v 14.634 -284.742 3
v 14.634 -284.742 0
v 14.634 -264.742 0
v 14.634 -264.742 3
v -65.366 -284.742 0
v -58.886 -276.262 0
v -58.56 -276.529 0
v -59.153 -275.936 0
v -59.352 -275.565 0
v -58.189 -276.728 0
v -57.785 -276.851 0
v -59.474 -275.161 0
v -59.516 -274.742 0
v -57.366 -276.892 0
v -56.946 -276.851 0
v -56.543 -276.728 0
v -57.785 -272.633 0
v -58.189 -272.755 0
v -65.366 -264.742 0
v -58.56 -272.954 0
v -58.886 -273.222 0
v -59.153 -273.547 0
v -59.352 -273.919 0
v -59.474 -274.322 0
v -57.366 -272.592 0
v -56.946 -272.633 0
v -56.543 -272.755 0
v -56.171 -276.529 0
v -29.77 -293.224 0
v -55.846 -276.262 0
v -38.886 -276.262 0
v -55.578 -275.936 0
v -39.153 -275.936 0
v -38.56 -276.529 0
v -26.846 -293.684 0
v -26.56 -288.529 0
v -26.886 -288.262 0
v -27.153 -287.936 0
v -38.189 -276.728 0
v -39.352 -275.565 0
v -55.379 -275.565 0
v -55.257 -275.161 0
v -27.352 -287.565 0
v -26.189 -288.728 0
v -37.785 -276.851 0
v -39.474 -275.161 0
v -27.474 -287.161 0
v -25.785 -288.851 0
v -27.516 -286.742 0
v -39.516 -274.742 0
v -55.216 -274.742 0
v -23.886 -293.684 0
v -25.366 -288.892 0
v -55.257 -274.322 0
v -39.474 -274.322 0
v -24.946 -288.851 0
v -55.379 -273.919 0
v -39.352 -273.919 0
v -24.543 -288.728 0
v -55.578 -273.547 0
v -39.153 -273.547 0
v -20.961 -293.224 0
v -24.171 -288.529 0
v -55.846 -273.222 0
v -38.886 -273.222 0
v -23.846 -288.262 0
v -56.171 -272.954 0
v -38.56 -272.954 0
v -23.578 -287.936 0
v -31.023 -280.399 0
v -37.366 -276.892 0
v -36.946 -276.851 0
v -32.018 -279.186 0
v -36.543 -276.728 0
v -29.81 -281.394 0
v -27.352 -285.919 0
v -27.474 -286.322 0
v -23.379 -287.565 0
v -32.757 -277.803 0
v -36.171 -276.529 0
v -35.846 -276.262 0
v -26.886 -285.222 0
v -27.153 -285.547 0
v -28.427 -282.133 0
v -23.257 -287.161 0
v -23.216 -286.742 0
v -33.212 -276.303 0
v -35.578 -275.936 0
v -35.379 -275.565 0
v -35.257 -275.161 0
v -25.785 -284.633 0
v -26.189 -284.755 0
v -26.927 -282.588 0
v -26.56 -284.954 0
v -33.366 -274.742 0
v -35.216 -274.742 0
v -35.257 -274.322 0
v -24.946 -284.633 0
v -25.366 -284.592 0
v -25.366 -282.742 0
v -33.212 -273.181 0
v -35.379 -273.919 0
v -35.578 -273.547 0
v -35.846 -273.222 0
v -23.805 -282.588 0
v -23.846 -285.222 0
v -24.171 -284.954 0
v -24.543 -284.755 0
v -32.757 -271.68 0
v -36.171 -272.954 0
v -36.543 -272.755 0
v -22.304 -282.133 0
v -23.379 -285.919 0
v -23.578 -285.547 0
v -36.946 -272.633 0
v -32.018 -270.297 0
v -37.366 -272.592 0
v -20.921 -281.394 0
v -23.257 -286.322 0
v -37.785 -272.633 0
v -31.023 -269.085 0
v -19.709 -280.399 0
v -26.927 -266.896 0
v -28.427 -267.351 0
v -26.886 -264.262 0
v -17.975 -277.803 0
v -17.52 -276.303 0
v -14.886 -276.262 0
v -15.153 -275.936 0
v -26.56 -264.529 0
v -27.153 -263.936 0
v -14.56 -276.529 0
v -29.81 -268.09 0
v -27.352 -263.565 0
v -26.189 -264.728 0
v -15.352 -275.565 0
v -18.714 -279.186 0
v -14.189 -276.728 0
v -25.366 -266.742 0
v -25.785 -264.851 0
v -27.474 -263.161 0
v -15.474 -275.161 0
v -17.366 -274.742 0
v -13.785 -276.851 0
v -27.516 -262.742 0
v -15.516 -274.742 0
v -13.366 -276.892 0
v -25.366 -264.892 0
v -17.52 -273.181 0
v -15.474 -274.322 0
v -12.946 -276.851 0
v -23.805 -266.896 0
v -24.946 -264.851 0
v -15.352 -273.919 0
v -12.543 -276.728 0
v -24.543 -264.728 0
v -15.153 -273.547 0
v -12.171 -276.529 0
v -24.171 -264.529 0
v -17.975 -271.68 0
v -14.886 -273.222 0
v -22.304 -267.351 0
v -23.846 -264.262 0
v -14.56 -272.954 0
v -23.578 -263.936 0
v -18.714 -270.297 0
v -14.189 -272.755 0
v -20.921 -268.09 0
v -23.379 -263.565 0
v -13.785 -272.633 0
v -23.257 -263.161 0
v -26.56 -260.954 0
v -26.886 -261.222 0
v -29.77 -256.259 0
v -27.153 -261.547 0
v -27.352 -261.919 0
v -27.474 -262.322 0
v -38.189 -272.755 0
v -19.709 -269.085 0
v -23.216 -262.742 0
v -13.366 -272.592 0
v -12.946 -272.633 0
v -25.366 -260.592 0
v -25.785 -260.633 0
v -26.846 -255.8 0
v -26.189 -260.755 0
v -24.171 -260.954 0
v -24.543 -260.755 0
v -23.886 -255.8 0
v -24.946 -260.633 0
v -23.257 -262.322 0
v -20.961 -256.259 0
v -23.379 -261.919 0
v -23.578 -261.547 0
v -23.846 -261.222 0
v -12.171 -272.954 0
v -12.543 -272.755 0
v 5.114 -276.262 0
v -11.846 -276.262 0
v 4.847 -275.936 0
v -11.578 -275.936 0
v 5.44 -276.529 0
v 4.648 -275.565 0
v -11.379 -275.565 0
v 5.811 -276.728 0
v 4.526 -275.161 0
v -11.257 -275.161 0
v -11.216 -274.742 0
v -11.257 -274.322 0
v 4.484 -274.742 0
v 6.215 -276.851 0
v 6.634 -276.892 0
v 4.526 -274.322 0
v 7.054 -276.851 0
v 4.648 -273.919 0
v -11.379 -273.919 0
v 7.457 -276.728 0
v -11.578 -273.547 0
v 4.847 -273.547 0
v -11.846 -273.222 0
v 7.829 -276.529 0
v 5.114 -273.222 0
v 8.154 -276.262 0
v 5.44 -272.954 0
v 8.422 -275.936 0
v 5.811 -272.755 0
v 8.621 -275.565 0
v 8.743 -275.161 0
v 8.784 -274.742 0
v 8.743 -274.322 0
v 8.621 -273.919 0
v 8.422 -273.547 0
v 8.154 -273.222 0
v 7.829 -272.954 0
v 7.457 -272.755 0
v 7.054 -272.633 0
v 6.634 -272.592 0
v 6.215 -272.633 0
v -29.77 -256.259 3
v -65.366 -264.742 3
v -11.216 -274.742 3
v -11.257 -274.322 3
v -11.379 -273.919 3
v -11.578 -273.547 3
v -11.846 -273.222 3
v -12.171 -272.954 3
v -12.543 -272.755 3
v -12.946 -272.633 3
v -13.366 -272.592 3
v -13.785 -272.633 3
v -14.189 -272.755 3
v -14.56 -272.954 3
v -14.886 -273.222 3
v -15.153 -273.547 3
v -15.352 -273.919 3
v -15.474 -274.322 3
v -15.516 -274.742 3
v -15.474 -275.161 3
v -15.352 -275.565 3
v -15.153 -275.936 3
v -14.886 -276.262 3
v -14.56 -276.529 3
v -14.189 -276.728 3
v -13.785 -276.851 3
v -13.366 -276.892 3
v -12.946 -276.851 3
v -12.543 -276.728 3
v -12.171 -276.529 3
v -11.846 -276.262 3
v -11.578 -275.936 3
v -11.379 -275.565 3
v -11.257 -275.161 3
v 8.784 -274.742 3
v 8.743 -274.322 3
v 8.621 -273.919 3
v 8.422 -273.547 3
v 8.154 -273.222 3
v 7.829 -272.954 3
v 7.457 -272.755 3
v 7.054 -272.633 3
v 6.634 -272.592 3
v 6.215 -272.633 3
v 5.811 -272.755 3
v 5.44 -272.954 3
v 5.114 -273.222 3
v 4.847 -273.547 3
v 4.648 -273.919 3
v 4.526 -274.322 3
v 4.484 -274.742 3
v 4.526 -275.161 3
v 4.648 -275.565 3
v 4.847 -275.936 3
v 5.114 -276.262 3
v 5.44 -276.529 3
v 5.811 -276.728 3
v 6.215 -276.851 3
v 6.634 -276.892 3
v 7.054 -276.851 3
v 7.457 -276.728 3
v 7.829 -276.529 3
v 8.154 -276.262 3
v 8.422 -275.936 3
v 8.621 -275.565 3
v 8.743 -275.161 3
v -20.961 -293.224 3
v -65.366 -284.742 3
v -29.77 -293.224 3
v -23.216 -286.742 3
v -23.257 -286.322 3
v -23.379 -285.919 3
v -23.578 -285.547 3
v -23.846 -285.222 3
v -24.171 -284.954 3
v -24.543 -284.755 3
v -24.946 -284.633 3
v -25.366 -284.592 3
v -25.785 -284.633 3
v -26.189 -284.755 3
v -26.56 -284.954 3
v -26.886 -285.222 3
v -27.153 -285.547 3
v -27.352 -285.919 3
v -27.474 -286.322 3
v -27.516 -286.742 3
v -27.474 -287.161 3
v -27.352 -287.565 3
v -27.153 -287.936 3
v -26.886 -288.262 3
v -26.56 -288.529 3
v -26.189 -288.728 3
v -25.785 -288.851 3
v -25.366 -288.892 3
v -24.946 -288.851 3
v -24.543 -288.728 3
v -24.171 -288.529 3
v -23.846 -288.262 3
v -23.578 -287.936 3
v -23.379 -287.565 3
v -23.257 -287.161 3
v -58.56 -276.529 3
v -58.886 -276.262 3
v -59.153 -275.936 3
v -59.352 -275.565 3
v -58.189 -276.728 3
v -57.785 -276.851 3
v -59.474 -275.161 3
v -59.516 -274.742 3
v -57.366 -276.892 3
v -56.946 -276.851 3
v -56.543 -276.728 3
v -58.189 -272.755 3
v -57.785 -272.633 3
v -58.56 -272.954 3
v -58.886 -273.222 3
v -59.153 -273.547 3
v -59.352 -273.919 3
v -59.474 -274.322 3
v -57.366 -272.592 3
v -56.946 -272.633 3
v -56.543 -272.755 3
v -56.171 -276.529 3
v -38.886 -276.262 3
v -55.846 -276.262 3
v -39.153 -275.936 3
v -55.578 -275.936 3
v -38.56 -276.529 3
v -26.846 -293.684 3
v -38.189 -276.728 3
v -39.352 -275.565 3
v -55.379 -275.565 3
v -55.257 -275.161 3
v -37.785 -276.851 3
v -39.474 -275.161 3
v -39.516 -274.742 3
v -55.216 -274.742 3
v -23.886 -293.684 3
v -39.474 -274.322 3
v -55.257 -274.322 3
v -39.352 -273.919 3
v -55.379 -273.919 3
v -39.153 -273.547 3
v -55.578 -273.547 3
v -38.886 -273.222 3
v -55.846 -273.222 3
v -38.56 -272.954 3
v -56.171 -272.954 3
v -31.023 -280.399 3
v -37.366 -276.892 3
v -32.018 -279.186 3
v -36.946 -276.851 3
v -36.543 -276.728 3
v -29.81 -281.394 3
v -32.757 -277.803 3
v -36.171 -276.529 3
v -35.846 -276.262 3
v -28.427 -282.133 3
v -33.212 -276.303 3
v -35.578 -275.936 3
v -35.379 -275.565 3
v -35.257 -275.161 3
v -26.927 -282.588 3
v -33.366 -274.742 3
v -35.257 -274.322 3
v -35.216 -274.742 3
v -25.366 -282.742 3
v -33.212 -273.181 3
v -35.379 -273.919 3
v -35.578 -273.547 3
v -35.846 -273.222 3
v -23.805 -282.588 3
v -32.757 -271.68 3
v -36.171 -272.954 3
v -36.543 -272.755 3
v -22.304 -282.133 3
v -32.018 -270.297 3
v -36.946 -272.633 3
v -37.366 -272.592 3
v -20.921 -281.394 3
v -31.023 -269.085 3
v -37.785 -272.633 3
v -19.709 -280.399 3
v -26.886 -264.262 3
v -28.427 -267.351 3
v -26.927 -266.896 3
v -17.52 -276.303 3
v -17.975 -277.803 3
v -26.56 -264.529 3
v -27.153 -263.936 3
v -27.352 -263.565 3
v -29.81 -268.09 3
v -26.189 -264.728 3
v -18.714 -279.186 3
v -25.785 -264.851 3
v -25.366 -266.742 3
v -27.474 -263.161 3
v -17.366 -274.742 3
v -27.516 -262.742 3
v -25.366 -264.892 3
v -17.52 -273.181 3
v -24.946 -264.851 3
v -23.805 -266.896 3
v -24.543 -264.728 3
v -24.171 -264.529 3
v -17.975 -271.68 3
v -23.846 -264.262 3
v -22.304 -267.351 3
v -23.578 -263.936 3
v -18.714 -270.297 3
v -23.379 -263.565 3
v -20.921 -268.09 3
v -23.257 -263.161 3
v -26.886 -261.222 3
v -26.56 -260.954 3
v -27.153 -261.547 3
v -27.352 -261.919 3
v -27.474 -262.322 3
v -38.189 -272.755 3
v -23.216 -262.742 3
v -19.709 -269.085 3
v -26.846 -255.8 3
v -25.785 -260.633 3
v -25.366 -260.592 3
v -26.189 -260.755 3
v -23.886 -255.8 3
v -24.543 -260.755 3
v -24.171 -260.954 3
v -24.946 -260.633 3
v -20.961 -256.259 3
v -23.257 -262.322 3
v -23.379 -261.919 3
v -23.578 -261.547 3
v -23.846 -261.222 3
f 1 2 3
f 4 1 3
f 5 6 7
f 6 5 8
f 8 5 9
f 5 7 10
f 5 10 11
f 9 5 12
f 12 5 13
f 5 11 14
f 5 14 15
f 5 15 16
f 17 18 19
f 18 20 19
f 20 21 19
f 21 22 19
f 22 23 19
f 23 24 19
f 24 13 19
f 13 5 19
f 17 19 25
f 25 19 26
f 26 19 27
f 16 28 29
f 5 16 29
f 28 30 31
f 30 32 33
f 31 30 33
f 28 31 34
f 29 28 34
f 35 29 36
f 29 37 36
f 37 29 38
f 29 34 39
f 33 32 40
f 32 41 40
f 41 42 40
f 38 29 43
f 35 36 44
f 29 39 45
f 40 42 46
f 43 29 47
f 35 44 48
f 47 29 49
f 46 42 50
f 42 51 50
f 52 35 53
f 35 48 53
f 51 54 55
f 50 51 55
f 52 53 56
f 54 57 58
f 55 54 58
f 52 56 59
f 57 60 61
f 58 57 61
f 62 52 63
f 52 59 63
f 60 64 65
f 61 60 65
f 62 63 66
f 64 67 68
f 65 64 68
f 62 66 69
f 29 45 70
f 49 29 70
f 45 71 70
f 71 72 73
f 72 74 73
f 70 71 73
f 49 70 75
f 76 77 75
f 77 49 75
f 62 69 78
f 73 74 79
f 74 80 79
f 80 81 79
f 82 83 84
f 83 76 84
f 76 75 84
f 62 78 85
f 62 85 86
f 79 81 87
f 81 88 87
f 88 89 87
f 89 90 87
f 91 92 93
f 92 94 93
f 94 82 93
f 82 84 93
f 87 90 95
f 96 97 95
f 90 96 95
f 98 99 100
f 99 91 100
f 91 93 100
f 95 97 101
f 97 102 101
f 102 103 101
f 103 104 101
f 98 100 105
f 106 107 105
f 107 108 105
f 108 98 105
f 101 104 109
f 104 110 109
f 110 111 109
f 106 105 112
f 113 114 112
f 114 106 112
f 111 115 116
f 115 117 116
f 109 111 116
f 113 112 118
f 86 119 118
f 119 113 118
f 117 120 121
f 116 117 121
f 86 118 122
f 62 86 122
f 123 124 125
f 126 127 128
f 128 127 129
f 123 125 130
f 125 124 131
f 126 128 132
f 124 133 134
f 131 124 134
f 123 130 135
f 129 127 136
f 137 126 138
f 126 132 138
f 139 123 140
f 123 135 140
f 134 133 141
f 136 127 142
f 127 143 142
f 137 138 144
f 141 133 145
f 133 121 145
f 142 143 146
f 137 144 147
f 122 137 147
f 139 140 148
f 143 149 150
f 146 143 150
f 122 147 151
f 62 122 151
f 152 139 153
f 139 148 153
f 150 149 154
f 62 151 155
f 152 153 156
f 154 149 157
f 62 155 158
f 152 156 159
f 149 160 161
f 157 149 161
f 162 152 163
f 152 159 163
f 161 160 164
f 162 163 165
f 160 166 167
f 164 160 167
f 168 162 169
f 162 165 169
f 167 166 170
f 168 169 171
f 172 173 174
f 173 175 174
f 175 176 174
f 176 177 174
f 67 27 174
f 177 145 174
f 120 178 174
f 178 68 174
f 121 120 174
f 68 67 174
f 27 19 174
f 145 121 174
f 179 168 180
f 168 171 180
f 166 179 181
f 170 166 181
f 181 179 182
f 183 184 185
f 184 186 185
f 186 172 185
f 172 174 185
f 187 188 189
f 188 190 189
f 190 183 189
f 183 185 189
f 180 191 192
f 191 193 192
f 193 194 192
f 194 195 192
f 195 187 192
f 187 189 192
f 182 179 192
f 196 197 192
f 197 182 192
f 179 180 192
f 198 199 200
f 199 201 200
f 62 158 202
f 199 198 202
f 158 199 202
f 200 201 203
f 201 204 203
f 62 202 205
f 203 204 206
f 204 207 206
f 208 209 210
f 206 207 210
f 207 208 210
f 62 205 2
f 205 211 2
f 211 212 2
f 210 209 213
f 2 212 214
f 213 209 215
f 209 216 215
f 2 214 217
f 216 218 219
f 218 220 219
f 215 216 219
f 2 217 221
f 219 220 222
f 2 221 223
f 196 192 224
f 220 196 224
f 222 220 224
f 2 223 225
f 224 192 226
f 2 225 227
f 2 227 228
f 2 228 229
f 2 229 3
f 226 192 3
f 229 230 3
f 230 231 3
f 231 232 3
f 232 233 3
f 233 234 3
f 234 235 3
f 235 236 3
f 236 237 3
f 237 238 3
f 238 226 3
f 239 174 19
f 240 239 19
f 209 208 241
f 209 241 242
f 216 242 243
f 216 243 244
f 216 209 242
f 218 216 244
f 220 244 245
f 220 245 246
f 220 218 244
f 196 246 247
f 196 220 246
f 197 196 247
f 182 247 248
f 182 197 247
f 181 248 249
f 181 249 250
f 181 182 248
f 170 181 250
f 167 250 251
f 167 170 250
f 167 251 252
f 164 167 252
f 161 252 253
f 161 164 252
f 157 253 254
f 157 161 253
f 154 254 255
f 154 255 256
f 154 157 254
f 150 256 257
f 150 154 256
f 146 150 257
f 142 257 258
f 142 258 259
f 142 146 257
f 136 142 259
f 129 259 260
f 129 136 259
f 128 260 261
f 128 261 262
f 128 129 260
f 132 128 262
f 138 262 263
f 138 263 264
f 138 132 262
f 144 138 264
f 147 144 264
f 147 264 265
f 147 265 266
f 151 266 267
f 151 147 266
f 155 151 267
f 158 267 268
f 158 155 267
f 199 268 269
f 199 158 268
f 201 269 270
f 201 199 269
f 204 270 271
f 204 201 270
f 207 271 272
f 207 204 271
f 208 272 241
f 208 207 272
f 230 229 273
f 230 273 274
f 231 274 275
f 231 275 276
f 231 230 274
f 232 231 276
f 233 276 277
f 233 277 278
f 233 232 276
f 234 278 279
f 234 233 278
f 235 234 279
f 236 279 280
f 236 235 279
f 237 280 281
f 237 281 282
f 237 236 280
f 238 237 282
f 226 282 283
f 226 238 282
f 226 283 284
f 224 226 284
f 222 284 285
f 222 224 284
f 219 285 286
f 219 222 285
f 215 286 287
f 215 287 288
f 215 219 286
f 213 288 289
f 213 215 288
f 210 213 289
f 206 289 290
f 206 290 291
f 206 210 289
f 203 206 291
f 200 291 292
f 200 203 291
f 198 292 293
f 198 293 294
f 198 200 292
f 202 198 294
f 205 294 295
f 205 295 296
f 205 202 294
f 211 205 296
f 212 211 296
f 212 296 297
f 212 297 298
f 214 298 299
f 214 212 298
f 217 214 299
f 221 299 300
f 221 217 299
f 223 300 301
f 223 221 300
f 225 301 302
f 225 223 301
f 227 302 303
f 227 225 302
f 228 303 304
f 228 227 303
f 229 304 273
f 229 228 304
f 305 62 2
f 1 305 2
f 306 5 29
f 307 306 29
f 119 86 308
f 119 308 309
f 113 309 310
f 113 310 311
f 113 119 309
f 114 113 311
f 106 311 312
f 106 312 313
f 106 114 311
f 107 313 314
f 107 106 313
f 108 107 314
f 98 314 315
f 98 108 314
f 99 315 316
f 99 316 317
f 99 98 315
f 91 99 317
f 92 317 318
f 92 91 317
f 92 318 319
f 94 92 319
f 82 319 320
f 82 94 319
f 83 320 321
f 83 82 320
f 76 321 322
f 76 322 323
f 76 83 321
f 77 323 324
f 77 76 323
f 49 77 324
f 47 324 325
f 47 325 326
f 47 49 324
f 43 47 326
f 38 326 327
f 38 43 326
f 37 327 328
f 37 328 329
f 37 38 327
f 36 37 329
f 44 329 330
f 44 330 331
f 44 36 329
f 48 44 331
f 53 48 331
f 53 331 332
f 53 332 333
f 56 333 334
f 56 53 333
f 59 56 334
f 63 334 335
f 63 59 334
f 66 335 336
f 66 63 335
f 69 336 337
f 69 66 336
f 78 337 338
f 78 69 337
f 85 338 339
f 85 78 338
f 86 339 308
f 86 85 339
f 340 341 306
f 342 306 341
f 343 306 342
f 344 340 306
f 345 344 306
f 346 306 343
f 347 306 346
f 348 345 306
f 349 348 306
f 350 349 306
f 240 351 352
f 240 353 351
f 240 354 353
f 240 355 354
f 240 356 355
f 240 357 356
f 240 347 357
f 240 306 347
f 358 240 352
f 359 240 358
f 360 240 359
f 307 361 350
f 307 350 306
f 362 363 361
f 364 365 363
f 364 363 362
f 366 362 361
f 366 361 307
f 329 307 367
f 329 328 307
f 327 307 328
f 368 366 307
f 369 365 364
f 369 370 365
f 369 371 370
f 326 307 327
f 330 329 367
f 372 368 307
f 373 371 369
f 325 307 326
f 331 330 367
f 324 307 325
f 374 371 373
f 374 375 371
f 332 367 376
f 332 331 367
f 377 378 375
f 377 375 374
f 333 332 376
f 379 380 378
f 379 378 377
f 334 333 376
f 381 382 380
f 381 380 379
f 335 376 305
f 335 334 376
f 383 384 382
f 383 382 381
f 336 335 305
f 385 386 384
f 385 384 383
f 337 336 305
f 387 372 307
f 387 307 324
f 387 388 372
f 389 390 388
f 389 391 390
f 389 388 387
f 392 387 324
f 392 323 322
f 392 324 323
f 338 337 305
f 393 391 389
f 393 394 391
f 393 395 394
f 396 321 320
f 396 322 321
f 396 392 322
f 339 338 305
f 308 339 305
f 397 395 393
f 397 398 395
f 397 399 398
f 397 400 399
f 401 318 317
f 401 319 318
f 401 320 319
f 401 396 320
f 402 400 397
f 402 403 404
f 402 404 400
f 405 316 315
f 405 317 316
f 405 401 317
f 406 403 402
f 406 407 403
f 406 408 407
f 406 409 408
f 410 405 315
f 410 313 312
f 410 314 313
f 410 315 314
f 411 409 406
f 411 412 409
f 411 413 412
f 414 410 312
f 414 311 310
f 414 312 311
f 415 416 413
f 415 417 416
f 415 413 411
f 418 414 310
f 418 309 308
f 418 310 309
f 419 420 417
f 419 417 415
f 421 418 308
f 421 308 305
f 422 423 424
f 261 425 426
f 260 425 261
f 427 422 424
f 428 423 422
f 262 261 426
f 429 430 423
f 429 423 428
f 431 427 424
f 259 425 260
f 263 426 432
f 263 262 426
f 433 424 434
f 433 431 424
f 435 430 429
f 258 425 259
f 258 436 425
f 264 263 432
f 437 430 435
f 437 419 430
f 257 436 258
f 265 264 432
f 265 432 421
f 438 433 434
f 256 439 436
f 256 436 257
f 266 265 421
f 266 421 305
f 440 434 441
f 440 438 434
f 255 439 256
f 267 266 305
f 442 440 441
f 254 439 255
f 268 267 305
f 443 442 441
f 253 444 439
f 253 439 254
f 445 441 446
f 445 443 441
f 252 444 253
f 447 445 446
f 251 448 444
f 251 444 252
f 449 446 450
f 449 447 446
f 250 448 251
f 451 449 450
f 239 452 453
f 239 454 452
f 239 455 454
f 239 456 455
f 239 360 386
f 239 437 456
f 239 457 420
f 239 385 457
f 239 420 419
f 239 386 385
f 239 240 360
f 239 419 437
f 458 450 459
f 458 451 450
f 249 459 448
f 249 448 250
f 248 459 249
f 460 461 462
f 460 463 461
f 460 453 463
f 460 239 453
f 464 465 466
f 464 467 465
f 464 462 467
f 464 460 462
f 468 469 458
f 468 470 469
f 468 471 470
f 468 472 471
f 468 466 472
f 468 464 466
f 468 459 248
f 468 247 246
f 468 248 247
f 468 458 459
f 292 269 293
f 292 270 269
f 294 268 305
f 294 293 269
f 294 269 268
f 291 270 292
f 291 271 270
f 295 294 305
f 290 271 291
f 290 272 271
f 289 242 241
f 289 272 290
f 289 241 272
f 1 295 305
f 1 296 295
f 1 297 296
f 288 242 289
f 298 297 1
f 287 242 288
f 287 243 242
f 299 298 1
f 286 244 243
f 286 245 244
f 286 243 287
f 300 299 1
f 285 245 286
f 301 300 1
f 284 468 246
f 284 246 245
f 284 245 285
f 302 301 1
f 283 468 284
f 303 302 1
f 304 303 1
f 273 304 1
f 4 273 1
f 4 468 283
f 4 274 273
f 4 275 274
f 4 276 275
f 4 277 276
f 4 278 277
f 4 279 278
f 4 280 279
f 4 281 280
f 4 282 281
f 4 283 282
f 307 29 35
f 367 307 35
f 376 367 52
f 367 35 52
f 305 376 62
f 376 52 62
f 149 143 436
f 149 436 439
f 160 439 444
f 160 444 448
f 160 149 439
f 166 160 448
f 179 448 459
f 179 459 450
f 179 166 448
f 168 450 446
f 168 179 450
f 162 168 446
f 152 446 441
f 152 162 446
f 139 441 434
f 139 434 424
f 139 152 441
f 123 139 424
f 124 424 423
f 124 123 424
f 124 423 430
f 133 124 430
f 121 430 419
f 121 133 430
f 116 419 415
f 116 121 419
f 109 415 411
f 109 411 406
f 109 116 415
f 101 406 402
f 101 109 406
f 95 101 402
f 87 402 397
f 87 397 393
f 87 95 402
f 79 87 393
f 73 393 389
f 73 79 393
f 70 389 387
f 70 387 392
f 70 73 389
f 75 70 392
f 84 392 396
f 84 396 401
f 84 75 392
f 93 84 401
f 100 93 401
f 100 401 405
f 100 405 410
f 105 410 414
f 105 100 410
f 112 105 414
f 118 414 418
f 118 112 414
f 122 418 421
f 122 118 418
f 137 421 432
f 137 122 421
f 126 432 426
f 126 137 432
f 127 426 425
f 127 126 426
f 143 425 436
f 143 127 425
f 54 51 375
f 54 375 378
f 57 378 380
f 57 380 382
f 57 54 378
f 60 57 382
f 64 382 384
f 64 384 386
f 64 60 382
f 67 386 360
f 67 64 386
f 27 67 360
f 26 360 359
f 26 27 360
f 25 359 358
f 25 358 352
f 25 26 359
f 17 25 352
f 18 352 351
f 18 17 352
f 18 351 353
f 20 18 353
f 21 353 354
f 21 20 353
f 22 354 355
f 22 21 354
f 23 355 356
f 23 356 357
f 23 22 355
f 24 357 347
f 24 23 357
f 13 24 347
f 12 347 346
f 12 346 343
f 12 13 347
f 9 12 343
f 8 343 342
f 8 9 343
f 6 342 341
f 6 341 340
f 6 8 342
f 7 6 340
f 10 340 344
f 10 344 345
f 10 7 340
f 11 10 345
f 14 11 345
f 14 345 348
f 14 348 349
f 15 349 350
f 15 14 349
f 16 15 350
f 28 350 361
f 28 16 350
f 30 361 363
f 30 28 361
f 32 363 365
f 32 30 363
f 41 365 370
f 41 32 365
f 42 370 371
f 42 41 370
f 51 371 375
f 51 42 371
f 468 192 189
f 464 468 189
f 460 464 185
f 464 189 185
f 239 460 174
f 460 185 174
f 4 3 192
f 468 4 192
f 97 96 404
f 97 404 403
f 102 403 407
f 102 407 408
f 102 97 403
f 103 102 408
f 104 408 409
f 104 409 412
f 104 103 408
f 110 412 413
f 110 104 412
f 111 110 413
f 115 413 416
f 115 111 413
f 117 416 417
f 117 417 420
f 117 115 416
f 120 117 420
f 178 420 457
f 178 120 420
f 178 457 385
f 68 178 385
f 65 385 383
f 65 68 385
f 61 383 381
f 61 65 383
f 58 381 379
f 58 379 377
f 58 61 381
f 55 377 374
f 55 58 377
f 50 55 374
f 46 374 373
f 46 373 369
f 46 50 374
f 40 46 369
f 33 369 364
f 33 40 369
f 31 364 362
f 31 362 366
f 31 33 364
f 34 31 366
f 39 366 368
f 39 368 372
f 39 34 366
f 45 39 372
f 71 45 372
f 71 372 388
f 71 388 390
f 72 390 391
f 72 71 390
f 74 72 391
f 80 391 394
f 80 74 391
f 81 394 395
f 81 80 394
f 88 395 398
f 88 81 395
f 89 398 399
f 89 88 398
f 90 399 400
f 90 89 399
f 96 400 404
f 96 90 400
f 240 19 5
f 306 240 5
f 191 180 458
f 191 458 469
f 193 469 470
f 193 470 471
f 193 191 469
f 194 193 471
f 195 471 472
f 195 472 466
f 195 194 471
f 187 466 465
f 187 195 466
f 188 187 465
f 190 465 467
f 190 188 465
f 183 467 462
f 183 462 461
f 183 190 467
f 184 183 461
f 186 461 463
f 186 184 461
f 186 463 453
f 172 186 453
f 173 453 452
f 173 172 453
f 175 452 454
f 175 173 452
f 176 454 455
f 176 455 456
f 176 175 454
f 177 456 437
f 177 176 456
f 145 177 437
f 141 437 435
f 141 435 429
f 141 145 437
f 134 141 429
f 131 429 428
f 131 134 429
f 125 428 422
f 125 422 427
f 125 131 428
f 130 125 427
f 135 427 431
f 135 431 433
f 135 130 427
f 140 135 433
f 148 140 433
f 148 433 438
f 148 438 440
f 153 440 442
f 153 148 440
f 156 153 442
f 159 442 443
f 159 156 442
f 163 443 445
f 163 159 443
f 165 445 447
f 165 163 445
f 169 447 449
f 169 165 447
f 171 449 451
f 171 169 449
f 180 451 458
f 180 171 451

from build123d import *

# Parameters (mm, degrees)
SKETCH1_R      = 2.15
SKETCH1_R_2    = 8
EXTRUDE1_DEPTH = 3


with BuildPart() as part:
    # Sketch1 → Extrude1 (new body)
    with BuildSketch(Plane.XY):
        with BuildLine():
            Line((-65.365803698, -264.741816005), (-65.365803698, -284.741816005))
            Line((-65.365803698, -284.741816005), (-29.77018823, -293.224277878))
            ThreePointArc((-29.77018823, -293.224277878), (-25.365803698, -293.741816005), (-20.961419166, -293.224277878))
            Line((-20.961419166, -293.224277878), (14.634196302, -284.741816005))
            Line((14.634196302, -284.741816005), (14.634196302, -264.741816005))
            Line((14.634196302, -264.741816005), (-20.961419166, -256.259354131))
            ThreePointArc((-20.961419166, -256.259354131), (-25.365803698, -255.741816005), (-29.77018823, -256.259354131))
            Line((-29.77018823, -256.259354131), (-65.365803698, -264.741816005))
        make_face()
        with Locations((-57.365803698, -274.741816005)):
            Circle(SKETCH1_R, mode=Mode.SUBTRACT)
        with Locations((-37.365803698, -274.741816005)):
            Circle(SKETCH1_R, mode=Mode.SUBTRACT)
        with Locations((-13.365803698, -274.741816005)):
            Circle(SKETCH1_R, mode=Mode.SUBTRACT)
        with Locations((6.634196302, -274.741816005)):
            Circle(SKETCH1_R, mode=Mode.SUBTRACT)
        with Locations((-25.365803698, -274.741816005)):
            Circle(SKETCH1_R_2, mode=Mode.SUBTRACT)
        with Locations((-25.365803698, -262.741816005)):
            Circle(SKETCH1_R, mode=Mode.SUBTRACT)
        with Locations((-25.365803698, -286.741816005)):
            Circle(SKETCH1_R, mode=Mode.SUBTRACT)
    extrude(amount=EXTRUDE1_DEPTH)


solid = part.part
